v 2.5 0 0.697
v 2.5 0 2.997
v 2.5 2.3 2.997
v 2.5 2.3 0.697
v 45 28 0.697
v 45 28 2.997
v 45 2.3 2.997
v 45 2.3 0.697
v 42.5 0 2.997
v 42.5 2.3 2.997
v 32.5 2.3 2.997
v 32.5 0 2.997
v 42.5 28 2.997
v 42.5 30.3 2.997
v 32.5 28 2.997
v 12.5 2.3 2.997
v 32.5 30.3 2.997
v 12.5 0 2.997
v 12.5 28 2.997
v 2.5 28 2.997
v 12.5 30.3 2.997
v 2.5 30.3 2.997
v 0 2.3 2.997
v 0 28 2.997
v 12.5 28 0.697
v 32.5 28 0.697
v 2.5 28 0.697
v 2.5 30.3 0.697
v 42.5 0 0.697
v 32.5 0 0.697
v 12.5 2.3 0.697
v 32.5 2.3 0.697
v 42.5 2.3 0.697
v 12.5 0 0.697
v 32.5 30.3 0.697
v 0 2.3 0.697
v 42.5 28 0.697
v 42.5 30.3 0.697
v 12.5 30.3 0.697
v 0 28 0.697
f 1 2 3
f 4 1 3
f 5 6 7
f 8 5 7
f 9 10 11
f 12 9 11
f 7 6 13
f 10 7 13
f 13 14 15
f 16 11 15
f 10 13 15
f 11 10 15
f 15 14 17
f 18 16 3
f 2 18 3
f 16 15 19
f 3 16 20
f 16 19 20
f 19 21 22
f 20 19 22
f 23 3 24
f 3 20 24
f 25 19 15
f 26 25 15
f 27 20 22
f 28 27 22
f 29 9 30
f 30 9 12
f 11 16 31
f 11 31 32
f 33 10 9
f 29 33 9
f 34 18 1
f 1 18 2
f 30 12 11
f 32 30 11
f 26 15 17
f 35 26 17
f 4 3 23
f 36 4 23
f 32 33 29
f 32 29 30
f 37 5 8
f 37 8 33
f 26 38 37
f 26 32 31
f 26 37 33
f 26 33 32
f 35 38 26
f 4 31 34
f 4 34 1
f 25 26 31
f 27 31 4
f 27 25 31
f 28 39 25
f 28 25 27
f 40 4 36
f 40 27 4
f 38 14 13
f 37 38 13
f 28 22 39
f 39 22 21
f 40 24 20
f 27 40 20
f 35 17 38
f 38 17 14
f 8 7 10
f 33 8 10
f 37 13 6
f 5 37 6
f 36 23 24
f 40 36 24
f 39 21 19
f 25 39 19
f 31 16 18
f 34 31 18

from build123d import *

# Parameters (mm, degrees)
BOSS_EXTRUDE1_DEPTH = 2.3


with BuildPart() as part:
    # Sketch1 → Boss-Extrude1 (new body)
    with BuildSketch(Plane.XY.offset(2.9972)):
        Polygon((0, 2.3), (0, 28), (2.5, 28), (2.5, 30.3), (12.5, 30.3), (12.5, 28), (32.5, 28), (32.5, 30.3), (42.5, 30.3), (42.5, 28), (45, 28), (45, 2.3), (42.5, 2.3), (42.5, 0), (32.5, 0), (32.5, 2.3), (22.5, 2.3), (12.5, 2.3), (12.5, 0), (2.5, 0), (2.5, 2.3), align=None)
    extrude(amount=-BOSS_EXTRUDE1_DEPTH)


solid = part.part
